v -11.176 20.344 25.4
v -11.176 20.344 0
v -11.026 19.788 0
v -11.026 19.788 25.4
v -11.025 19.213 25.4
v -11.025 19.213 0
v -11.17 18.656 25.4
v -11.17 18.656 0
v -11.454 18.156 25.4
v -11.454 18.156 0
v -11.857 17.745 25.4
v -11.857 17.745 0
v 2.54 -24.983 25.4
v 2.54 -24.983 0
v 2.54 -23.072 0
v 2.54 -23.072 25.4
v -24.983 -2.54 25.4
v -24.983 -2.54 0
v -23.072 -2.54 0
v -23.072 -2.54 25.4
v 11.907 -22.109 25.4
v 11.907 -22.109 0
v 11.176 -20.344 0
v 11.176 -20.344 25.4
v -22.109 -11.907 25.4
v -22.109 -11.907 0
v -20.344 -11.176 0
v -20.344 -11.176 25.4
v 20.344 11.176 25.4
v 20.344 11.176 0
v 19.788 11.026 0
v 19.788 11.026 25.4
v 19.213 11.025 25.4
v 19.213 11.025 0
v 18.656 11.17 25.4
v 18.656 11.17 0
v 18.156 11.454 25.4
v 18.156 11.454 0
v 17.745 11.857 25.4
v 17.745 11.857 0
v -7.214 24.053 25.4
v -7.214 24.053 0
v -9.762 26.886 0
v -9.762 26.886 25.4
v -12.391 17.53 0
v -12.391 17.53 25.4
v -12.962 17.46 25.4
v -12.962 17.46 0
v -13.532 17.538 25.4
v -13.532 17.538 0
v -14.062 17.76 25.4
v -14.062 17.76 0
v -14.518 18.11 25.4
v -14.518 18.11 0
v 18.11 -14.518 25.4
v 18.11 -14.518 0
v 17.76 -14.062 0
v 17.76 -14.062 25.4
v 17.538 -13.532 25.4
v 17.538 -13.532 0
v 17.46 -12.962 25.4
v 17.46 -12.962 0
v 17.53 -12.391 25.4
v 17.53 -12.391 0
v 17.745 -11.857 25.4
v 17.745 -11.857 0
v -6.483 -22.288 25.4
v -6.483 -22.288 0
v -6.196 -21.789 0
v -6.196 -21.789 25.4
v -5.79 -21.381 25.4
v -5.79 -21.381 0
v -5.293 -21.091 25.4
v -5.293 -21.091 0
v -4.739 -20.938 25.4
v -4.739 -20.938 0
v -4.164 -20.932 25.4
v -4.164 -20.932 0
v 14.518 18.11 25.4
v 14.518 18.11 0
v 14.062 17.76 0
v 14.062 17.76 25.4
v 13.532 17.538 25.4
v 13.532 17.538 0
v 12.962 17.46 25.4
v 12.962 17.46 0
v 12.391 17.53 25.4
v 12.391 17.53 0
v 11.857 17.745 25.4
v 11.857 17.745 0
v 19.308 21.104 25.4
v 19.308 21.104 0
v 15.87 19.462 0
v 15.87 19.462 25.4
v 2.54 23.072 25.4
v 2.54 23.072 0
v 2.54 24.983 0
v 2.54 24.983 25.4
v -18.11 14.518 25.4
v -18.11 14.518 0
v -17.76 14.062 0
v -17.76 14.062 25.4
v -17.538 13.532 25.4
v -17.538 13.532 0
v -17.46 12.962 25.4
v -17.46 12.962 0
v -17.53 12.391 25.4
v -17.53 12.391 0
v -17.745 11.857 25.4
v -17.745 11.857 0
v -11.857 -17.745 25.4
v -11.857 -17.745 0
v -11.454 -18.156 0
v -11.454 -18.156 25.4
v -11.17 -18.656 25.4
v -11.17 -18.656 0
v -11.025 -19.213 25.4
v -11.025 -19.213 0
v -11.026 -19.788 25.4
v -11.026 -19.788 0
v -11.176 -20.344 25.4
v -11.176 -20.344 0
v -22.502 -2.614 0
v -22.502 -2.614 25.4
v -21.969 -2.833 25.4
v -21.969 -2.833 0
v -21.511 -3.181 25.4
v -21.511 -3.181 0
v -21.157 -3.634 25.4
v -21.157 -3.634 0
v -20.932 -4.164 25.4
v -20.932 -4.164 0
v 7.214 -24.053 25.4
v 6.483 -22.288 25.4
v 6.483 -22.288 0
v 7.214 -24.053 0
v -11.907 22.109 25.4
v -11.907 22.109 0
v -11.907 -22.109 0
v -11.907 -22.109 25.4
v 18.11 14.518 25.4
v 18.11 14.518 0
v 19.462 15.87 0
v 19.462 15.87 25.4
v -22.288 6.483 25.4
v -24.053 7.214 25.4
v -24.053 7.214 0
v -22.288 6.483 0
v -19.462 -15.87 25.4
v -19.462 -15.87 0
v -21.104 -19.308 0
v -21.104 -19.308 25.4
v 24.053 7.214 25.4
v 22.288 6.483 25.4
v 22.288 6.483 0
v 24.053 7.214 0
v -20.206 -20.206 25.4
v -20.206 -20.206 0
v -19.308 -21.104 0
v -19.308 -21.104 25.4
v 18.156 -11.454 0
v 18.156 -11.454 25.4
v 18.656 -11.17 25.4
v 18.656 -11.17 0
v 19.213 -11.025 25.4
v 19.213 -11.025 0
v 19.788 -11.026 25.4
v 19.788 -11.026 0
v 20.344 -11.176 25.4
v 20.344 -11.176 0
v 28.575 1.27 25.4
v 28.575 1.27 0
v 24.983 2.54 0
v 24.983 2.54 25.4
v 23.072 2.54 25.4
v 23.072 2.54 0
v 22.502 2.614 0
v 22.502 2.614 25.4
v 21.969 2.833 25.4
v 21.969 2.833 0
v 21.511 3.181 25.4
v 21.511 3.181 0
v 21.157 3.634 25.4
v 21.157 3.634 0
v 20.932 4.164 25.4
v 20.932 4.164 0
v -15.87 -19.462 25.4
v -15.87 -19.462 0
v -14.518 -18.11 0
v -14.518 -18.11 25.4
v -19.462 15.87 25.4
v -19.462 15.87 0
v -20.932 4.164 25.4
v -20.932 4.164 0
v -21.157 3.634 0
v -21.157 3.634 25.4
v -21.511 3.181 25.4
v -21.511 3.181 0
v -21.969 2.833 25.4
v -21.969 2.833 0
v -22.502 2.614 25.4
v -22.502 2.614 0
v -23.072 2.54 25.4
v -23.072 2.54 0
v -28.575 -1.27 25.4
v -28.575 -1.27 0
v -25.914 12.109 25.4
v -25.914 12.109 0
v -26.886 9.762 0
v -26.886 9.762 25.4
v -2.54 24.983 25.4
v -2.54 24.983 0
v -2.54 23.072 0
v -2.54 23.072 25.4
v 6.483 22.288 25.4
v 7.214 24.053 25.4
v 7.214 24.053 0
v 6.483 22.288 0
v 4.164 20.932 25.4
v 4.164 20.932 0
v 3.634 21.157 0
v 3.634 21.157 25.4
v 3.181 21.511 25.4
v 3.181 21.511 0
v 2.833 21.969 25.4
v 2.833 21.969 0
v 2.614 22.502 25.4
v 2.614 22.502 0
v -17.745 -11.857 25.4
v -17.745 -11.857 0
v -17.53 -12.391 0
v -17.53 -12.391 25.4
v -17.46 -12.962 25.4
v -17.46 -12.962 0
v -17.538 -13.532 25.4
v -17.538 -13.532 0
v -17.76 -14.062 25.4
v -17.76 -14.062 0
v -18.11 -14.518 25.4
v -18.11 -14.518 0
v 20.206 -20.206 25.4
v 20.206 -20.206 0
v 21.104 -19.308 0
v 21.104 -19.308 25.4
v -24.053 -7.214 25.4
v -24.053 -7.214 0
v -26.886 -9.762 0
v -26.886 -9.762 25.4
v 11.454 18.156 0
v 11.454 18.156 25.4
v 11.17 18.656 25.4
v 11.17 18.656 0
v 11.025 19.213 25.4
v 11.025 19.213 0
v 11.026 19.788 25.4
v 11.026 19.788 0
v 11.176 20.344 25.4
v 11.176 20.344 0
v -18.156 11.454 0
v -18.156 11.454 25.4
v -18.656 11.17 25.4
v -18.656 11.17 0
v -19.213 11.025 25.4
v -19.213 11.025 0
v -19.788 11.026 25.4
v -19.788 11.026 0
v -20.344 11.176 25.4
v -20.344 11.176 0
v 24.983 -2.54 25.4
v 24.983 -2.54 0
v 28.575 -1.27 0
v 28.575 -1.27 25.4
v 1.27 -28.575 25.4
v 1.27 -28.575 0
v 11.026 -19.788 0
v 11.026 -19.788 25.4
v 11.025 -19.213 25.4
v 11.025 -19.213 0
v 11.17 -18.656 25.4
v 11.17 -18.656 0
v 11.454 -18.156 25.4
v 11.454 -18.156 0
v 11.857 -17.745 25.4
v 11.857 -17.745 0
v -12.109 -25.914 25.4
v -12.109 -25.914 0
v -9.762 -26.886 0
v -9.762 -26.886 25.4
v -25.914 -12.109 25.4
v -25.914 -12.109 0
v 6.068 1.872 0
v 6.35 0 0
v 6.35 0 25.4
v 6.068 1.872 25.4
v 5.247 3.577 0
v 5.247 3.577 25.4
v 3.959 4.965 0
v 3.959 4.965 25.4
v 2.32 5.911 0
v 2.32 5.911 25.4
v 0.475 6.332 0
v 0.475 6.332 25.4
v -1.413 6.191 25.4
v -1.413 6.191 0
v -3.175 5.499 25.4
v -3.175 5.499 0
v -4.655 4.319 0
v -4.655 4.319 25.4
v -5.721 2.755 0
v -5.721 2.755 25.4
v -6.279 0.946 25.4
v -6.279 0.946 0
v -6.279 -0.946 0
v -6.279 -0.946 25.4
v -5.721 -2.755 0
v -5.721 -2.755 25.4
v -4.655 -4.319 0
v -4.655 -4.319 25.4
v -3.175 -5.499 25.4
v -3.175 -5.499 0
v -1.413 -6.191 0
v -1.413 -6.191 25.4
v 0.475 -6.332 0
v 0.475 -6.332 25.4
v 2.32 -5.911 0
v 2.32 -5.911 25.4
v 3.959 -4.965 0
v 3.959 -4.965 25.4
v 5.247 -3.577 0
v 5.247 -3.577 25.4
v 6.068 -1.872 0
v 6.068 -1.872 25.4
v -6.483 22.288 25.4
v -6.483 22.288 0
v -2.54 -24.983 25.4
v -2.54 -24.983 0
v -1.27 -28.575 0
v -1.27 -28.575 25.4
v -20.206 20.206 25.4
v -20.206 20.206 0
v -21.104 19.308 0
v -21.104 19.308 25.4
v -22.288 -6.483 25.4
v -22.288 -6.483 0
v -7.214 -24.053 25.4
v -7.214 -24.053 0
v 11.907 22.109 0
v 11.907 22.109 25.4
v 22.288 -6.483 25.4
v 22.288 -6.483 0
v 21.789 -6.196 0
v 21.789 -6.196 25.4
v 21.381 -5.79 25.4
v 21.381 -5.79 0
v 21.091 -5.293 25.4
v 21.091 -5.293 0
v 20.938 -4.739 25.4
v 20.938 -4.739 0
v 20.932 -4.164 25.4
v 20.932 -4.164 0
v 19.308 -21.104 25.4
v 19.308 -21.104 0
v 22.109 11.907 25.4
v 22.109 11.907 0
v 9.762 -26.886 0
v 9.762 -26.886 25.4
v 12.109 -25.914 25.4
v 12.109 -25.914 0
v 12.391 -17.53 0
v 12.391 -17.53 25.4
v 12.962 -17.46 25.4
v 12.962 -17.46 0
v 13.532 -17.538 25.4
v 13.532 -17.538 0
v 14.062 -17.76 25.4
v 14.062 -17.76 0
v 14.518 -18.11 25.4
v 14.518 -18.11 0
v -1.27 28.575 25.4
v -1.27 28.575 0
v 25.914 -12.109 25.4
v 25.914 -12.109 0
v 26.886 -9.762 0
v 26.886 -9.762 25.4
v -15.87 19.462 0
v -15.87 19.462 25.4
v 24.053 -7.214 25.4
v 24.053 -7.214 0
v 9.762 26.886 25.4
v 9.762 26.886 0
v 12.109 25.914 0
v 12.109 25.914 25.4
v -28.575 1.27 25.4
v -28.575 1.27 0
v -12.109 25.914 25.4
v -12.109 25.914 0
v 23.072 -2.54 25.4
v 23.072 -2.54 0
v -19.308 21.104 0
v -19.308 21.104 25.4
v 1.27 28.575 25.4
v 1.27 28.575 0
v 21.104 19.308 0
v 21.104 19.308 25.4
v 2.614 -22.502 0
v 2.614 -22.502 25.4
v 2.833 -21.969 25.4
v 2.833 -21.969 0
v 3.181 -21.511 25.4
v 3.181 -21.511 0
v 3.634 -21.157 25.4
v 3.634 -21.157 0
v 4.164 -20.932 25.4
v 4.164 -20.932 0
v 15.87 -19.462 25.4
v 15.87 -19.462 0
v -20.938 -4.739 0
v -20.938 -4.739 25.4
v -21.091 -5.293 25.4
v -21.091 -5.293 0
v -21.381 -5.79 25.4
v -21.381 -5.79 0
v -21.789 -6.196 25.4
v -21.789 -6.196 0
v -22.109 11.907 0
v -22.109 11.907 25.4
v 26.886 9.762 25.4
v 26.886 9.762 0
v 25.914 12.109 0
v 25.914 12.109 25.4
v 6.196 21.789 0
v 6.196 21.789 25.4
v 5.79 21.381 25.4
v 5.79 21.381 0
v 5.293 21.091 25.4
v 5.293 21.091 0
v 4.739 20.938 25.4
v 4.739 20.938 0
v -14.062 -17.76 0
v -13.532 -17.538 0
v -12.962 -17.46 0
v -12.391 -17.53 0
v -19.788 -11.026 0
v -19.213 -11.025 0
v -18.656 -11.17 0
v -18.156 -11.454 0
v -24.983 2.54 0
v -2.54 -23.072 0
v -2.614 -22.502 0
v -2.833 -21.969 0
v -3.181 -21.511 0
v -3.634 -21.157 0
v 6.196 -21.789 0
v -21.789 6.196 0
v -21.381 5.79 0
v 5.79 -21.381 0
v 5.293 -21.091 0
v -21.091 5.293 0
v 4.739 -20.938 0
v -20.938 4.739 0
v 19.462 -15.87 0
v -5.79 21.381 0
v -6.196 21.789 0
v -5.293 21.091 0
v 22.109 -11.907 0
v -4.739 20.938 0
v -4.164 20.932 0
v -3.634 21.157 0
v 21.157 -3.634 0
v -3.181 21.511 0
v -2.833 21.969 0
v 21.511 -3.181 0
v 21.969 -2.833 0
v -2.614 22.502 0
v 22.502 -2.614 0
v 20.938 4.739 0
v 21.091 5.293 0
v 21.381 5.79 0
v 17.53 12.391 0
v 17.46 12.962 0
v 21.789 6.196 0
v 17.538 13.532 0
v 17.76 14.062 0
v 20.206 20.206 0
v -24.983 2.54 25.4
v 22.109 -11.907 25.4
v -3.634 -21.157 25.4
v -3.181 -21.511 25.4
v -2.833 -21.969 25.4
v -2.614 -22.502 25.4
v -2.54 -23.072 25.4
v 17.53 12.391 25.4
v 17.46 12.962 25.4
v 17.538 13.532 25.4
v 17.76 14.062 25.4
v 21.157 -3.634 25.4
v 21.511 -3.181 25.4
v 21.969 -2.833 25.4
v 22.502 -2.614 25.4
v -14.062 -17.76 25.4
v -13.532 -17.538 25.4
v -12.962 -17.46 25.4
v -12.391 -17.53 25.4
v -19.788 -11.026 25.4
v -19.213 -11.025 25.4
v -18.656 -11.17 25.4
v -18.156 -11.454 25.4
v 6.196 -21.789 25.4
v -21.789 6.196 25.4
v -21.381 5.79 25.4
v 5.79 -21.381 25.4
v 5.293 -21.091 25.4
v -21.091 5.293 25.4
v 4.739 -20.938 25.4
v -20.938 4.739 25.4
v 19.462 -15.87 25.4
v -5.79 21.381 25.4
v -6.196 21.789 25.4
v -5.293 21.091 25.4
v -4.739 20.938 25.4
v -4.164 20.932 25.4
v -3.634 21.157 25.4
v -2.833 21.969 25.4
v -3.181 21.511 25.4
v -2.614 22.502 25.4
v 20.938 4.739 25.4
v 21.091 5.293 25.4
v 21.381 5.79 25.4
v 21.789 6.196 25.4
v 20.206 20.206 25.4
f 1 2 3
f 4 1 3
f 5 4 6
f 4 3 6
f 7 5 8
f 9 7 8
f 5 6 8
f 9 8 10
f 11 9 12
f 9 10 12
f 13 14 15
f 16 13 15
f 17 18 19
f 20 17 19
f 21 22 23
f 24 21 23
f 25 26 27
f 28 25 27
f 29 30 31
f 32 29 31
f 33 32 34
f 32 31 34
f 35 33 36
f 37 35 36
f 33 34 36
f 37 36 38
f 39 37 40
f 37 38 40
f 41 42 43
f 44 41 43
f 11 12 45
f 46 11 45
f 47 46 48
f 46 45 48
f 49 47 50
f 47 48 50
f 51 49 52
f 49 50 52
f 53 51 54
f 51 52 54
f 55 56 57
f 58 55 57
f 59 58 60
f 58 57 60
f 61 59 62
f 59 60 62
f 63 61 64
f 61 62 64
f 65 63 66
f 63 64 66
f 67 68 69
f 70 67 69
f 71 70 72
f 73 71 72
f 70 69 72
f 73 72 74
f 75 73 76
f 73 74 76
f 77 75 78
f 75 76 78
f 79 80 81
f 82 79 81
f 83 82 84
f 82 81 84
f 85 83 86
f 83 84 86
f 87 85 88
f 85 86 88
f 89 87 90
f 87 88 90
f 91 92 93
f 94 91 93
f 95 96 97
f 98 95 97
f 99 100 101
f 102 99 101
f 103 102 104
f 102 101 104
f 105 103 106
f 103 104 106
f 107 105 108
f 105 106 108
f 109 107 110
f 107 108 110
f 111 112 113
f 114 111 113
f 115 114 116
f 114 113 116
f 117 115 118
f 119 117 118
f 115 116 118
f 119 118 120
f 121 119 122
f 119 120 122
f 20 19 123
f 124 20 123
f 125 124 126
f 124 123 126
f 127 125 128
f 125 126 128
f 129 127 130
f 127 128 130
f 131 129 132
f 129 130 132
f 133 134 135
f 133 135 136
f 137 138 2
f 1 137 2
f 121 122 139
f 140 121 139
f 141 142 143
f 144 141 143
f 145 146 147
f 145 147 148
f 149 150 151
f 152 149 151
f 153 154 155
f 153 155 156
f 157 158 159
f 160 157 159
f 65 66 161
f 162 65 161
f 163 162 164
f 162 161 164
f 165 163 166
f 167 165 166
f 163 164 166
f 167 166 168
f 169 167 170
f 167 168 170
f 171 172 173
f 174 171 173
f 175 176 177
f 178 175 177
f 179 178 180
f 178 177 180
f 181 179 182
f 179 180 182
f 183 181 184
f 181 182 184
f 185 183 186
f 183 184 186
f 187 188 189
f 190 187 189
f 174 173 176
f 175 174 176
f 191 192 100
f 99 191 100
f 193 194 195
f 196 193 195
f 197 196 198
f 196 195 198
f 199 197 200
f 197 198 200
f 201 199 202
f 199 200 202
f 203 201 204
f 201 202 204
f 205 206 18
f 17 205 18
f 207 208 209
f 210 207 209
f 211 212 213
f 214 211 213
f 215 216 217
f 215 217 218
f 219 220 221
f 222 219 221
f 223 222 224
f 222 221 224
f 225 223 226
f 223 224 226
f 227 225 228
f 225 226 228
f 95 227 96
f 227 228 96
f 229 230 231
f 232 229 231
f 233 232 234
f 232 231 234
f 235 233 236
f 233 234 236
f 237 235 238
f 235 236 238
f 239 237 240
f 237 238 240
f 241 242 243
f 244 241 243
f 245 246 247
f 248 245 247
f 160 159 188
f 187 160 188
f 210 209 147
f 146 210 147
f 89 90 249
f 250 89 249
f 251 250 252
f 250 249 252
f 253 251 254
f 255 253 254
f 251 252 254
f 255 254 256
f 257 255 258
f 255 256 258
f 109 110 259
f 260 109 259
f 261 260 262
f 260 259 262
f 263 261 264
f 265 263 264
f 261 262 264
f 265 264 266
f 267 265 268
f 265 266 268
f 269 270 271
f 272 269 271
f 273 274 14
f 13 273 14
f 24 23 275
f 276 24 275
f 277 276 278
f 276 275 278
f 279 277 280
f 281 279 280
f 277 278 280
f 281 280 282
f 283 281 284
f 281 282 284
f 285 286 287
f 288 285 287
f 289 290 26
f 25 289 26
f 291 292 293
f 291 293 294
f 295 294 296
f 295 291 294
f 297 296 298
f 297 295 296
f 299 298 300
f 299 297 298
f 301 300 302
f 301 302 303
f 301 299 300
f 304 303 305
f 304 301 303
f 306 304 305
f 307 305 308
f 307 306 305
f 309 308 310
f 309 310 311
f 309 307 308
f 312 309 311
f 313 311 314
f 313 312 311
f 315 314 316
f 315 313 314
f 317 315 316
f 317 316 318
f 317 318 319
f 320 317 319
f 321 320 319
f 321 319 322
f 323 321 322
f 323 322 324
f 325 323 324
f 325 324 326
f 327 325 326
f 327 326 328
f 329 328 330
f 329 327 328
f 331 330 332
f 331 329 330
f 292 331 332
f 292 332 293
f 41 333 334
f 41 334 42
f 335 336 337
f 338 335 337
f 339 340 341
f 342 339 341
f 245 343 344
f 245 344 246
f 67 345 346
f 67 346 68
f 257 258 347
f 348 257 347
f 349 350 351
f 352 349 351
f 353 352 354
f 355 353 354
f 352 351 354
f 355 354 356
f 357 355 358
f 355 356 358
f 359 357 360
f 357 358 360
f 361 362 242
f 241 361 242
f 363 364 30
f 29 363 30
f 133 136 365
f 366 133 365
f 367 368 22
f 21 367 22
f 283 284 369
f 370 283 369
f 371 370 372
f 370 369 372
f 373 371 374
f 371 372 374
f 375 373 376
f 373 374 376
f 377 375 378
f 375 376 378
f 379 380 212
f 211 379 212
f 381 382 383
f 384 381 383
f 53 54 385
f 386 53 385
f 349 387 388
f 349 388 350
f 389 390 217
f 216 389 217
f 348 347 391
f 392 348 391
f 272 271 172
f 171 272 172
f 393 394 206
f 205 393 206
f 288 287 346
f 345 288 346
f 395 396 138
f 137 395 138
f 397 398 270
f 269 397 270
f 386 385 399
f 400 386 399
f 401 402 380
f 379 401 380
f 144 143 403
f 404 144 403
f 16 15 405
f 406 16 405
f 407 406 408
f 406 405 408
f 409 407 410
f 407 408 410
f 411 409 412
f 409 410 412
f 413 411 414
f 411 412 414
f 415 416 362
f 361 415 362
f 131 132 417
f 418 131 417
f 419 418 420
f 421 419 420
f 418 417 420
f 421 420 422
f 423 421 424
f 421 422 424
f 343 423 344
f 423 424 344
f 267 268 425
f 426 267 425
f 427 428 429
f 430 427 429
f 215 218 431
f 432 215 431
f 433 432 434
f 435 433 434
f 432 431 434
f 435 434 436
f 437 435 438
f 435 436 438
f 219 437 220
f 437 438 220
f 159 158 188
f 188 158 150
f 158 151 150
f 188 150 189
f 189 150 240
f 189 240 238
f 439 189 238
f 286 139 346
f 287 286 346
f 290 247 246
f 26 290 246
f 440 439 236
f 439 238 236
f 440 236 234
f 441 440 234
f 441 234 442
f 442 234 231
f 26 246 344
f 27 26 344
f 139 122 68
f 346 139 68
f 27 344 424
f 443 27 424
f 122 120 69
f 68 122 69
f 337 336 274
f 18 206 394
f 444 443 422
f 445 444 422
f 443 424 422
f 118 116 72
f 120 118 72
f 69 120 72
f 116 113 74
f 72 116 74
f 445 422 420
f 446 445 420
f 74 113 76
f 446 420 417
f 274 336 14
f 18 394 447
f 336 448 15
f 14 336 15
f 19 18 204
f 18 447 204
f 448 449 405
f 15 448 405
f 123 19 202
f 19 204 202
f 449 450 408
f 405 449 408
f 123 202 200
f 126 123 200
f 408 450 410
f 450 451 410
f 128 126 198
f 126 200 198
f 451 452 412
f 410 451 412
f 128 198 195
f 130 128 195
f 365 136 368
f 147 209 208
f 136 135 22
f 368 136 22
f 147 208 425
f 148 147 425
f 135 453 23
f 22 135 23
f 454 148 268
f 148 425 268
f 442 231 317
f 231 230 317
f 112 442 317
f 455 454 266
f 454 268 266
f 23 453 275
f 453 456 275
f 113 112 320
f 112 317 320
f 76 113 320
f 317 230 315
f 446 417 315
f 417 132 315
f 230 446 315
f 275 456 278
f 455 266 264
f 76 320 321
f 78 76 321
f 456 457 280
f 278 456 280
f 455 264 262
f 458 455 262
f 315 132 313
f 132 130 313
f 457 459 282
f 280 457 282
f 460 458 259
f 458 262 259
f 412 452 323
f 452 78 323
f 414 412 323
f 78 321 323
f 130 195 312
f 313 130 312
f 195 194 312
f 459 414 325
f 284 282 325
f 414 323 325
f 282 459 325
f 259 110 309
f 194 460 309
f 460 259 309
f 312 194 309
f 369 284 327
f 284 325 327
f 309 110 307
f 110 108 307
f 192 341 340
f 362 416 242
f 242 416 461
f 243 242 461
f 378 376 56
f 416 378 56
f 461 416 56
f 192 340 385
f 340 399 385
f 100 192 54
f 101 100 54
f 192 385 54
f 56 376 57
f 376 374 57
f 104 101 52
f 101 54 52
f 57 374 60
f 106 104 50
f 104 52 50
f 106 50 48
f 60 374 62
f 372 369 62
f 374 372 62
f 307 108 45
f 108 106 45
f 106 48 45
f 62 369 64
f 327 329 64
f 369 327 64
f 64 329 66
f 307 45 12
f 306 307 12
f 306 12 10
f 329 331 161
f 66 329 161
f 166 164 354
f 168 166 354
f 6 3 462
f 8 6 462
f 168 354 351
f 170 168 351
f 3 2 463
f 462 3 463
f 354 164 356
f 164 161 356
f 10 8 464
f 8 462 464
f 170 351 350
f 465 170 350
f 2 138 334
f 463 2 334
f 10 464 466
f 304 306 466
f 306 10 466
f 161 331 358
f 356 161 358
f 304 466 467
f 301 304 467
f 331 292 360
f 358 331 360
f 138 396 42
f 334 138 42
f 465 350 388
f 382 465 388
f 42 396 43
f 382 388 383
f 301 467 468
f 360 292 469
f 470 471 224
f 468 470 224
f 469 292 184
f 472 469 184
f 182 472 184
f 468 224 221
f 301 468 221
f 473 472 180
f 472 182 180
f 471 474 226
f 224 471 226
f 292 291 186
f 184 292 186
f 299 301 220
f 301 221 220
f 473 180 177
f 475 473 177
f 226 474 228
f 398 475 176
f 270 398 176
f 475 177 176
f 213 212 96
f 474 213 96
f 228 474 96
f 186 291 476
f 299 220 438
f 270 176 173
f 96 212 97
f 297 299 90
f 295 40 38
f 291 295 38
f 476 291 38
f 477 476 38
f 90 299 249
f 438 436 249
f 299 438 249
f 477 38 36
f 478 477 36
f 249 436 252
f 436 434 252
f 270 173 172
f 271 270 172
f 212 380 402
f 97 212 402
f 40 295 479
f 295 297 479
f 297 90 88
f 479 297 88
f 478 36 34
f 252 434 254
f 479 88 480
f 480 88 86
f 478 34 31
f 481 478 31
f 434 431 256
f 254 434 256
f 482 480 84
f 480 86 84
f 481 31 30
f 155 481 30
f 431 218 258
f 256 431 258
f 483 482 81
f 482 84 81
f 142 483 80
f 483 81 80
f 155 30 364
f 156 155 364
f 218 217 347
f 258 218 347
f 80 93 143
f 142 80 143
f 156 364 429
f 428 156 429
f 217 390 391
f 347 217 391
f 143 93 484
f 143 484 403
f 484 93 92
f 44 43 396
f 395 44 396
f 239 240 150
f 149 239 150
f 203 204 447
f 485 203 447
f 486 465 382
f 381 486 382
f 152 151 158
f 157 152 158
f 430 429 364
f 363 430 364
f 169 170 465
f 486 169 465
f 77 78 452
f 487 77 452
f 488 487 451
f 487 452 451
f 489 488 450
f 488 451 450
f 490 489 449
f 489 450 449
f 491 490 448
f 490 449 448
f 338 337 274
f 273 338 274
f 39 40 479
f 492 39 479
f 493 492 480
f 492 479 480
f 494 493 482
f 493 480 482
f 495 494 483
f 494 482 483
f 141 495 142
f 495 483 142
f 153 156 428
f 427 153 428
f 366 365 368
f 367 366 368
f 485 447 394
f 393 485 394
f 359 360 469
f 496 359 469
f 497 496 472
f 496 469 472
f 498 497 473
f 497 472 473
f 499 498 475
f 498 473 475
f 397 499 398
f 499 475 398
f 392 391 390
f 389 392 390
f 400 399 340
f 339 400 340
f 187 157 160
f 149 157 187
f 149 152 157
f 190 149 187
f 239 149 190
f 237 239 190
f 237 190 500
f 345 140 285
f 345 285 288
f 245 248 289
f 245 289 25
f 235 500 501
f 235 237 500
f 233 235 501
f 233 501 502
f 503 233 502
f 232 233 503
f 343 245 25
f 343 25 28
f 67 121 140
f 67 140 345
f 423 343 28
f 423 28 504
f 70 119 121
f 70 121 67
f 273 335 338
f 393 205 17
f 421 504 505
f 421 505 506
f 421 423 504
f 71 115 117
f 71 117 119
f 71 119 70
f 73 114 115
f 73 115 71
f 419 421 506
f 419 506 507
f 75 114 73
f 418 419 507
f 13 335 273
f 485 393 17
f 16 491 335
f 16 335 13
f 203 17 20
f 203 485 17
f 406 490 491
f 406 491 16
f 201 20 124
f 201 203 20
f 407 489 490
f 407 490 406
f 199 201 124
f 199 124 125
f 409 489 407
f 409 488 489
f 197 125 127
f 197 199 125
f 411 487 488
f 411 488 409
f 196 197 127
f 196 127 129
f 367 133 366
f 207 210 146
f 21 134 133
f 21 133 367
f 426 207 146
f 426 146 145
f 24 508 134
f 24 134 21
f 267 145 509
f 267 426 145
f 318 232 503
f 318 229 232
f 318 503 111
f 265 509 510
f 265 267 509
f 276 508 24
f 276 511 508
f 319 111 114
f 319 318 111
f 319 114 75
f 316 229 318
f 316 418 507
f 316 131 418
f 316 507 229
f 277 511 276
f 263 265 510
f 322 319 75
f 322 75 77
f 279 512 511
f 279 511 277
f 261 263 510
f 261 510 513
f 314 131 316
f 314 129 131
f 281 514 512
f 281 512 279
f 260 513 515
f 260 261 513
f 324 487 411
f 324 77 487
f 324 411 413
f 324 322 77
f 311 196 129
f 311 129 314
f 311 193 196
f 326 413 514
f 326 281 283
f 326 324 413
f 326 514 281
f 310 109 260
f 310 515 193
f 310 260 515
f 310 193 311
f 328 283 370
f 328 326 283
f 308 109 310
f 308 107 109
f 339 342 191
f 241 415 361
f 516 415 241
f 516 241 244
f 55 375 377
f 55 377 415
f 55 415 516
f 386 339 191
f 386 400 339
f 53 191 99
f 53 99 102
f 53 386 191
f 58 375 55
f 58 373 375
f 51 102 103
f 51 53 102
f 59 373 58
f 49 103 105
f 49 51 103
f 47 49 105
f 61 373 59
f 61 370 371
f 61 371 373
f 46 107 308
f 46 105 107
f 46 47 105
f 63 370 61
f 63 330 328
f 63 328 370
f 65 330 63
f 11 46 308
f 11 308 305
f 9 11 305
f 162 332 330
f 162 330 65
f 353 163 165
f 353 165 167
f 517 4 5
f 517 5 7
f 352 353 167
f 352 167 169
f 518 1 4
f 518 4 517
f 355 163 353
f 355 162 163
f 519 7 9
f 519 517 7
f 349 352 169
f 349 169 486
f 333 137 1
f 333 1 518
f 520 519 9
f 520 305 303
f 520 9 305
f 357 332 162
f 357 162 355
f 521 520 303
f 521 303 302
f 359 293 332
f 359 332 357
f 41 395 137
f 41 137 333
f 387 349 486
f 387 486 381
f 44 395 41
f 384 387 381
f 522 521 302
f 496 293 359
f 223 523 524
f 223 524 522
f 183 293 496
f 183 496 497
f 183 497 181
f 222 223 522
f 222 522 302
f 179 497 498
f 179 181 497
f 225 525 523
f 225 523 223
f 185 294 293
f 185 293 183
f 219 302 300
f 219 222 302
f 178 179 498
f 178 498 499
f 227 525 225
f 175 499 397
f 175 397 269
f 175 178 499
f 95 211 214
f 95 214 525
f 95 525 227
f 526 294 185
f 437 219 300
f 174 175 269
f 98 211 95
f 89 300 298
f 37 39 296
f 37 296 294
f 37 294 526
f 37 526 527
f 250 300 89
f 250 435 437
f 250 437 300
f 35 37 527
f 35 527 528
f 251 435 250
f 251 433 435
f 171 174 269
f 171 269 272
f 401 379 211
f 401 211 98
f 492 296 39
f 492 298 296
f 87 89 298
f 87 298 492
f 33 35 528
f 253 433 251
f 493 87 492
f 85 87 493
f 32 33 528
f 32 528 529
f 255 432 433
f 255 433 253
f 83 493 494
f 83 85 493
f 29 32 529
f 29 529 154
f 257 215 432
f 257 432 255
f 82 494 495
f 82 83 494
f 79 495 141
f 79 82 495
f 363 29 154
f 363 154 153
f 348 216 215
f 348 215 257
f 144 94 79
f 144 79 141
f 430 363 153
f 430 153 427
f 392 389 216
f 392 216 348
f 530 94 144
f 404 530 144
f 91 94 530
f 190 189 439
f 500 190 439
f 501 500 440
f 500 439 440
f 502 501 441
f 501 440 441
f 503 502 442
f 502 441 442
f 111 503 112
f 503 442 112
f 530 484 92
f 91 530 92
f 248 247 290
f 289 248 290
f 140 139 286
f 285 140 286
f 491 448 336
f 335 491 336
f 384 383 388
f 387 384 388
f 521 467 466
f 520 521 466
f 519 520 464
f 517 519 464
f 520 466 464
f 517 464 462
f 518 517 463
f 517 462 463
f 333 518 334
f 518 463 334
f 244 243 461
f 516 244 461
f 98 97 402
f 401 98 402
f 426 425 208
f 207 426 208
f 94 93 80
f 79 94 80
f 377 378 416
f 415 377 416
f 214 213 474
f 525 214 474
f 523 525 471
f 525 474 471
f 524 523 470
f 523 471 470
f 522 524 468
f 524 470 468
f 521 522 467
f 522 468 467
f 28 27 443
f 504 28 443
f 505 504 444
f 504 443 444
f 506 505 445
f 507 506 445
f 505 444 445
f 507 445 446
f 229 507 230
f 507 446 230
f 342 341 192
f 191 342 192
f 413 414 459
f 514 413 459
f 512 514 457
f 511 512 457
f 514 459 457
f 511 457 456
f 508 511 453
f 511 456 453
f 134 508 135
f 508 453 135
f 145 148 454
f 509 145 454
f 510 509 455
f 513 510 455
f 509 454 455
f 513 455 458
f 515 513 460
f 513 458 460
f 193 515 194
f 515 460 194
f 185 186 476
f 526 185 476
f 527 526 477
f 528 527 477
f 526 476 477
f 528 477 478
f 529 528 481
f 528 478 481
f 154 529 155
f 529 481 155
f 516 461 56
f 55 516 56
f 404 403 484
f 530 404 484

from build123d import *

# Parameters (mm, degrees)
F0_R     = 6.35
F1_DEPTH = 25.4


with BuildPart() as f1:
    # F0 (on Top) → F1 (new body)
    with BuildSketch(Plane.XY):
        with BuildLine():
            Line((1.27, 28.575), (0, 28.575))
            Line((0, 28.575), (-1.27, 28.575))
            Line((-1.27, 28.575), (-2.54, 24.982901))
            Line((-2.54, 24.982901), (-2.54, 23.072094))
            ThreePointArc((-2.54, 23.072094), (-2.991826, 21.728881), (-4.163596, 20.931809))
            ThreePointArc((-4.163596, 20.931809), (-5.551196, 21.219791), (-6.482654, 22.287851))
            Line((-6.482654, 22.287851), (-7.213888, 24.053207))
            Line((-7.213888, 24.053207), (-9.761852, 26.885866))
            Line((-9.761852, 26.885866), (-10.935179, 26.399858))
            Line((-10.935179, 26.399858), (-12.108506, 25.91385))
            Line((-12.108506, 25.91385), (-11.907196, 22.109175))
            Line((-11.907196, 22.109175), (-11.175962, 20.343819))
            ThreePointArc((-11.175962, 20.343819), (-11.07937, 18.929946), (-11.856917, 17.745131))
            ThreePointArc((-11.856917, 17.745131), (-13.249099, 17.48018), (-14.518383, 18.110485))
            Line((-14.518383, 18.110485), (-15.869528, 19.46163))
            Line((-15.869528, 19.46163), (-19.307551, 21.103602))
            Line((-19.307551, 21.103602), (-20.205576, 20.205576))
            Line((-20.205576, 20.205576), (-21.103602, 19.307551))
            Line((-21.103602, 19.307551), (-19.46163, 15.869528))
            Line((-19.46163, 15.869528), (-18.110485, 14.518383))
            ThreePointArc((-18.110485, 14.518383), (-17.48018, 13.249099), (-17.745131, 11.856917))
            ThreePointArc((-17.745131, 11.856917), (-18.929946, 11.07937), (-20.343819, 11.175962))
            Line((-20.343819, 11.175962), (-22.109175, 11.907196))
            Line((-22.109175, 11.907196), (-25.91385, 12.108506))
            Line((-25.91385, 12.108506), (-26.399858, 10.935179))
            Line((-26.399858, 10.935179), (-26.885866, 9.761852))
            Line((-26.885866, 9.761852), (-24.053207, 7.213888))
            Line((-24.053207, 7.213888), (-22.287851, 6.482654))
            ThreePointArc((-22.287851, 6.482654), (-21.219791, 5.551196), (-20.931809, 4.163596))
            ThreePointArc((-20.931809, 4.163596), (-21.728881, 2.991826), (-23.072094, 2.54))
            Line((-23.072094, 2.54), (-24.982901, 2.54))
            Line((-24.982901, 2.54), (-28.575, 1.27))
            Line((-28.575, 1.27), (-28.575, 0))
            Line((-28.575, 0), (-28.575, -1.27))
            Line((-28.575, -1.27), (-24.982901, -2.54))
            Line((-24.982901, -2.54), (-23.072094, -2.54))
            ThreePointArc((-23.072094, -2.54), (-21.728881, -2.991826), (-20.931809, -4.163596))
            ThreePointArc((-20.931809, -4.163596), (-21.219791, -5.551196), (-22.287851, -6.482654))
            Line((-22.287851, -6.482654), (-24.053207, -7.213888))
            Line((-24.053207, -7.213888), (-26.885866, -9.761852))
            Line((-26.885866, -9.761852), (-26.399858, -10.935179))
            Line((-26.399858, -10.935179), (-25.91385, -12.108506))
            Line((-25.91385, -12.108506), (-22.109175, -11.907196))
            Line((-22.109175, -11.907196), (-20.343819, -11.175962))
            ThreePointArc((-20.343819, -11.175962), (-18.929946, -11.07937), (-17.745131, -11.856917))
            ThreePointArc((-17.745131, -11.856917), (-17.48018, -13.249099), (-18.110485, -14.518383))
            Line((-18.110485, -14.518383), (-19.46163, -15.869528))
            Line((-19.46163, -15.869528), (-21.103602, -19.307551))
            Line((-21.103602, -19.307551), (-20.205576, -20.205576))
            Line((-20.205576, -20.205576), (-19.307551, -21.103602))
            Line((-19.307551, -21.103602), (-15.869528, -19.46163))
            Line((-15.869528, -19.46163), (-14.518383, -18.110485))
            ThreePointArc((-14.518383, -18.110485), (-13.249099, -17.48018), (-11.856917, -17.745131))
            ThreePointArc((-11.856917, -17.745131), (-11.07937, -18.929946), (-11.175962, -20.343819))
            Line((-11.175962, -20.343819), (-11.907196, -22.109175))
            Line((-11.907196, -22.109175), (-12.108506, -25.91385))
            Line((-12.108506, -25.91385), (-10.935179, -26.399858))
            Line((-10.935179, -26.399858), (-9.761852, -26.885866))
            Line((-9.761852, -26.885866), (-7.213888, -24.053207))
            Line((-7.213888, -24.053207), (-6.482654, -22.287851))
            ThreePointArc((-6.482654, -22.287851), (-5.551196, -21.219791), (-4.163596, -20.931809))
            ThreePointArc((-4.163596, -20.931809), (-2.991826, -21.728881), (-2.54, -23.072094))
            Line((-2.54, -23.072094), (-2.54, -24.982901))
            Line((-2.54, -24.982901), (-1.27, -28.575))
            Line((-1.27, -28.575), (0, -28.575))
            Line((0, -28.575), (1.27, -28.575))
            Line((1.27, -28.575), (2.54, -24.982901))
            Line((2.54, -24.982901), (2.54, -23.072094))
            ThreePointArc((2.54, -23.072094), (2.991826, -21.728881), (4.163596, -20.931809))
            ThreePointArc((4.163596, -20.931809), (5.551196, -21.219791), (6.482654, -22.287851))
            Line((6.482654, -22.287851), (7.213888, -24.053207))
            Line((7.213888, -24.053207), (9.761852, -26.885866))
            Line((9.761852, -26.885866), (10.935179, -26.399858))
            Line((10.935179, -26.399858), (12.108506, -25.91385))
            Line((12.108506, -25.91385), (11.907196, -22.109175))
            Line((11.907196, -22.109175), (11.175962, -20.343819))
            ThreePointArc((11.175962, -20.343819), (11.07937, -18.929946), (11.856917, -17.745131))
            ThreePointArc((11.856917, -17.745131), (13.249099, -17.48018), (14.518383, -18.110485))
            Line((14.518383, -18.110485), (15.869528, -19.46163))
            Line((15.869528, -19.46163), (19.307551, -21.103602))
            Line((19.307551, -21.103602), (20.205576, -20.205576))
            Line((20.205576, -20.205576), (21.103602, -19.307551))
            Line((21.103602, -19.307551), (19.46163, -15.869528))
            Line((19.46163, -15.869528), (18.110485, -14.518383))
            ThreePointArc((18.110485, -14.518383), (17.48018, -13.249099), (17.745131, -11.856917))
            ThreePointArc((17.745131, -11.856917), (18.929946, -11.07937), (20.343819, -11.175962))
            Line((20.343819, -11.175962), (22.109175, -11.907196))
            Line((22.109175, -11.907196), (25.91385, -12.108506))
            Line((25.91385, -12.108506), (26.399858, -10.935179))
            Line((26.399858, -10.935179), (26.885866, -9.761852))
            Line((26.885866, -9.761852), (24.053207, -7.213888))
            Line((24.053207, -7.213888), (22.287851, -6.482654))
            ThreePointArc((22.287851, -6.482654), (21.219791, -5.551196), (20.931809, -4.163596))
            ThreePointArc((20.931809, -4.163596), (21.728881, -2.991826), (23.072094, -2.54))
            Line((23.072094, -2.54), (24.982901, -2.54))
            Line((24.982901, -2.54), (28.575, -1.27))
            Line((28.575, -1.27), (28.575, 0))
            Line((28.575, 0), (28.575, 1.27))
            Line((28.575, 1.27), (24.982901, 2.54))
            Line((24.982901, 2.54), (23.072094, 2.54))
            ThreePointArc((23.072094, 2.54), (21.728881, 2.991826), (20.931809, 4.163596))
            ThreePointArc((20.931809, 4.163596), (21.219791, 5.551196), (22.287851, 6.482654))
            Line((22.287851, 6.482654), (24.053207, 7.213888))
            Line((24.053207, 7.213888), (26.885866, 9.761852))
            Line((26.885866, 9.761852), (26.399858, 10.935179))
            Line((26.399858, 10.935179), (25.91385, 12.108506))
            Line((25.91385, 12.108506), (22.109175, 11.907196))
            Line((22.109175, 11.907196), (20.343819, 11.175962))
            ThreePointArc((20.343819, 11.175962), (18.929946, 11.07937), (17.745131, 11.856917))
            ThreePointArc((17.745131, 11.856917), (17.48018, 13.249099), (18.110485, 14.518383))
            Line((18.110485, 14.518383), (19.46163, 15.869528))
            Line((19.46163, 15.869528), (21.103602, 19.307551))
            Line((21.103602, 19.307551), (20.205576, 20.205576))
            Line((20.205576, 20.205576), (19.307551, 21.103602))
            Line((19.307551, 21.103602), (15.869528, 19.46163))
            Line((15.869528, 19.46163), (14.518383, 18.110485))
            ThreePointArc((14.518383, 18.110485), (13.249099, 17.48018), (11.856917, 17.745131))
            ThreePointArc((11.856917, 17.745131), (11.07937, 18.929946), (11.175962, 20.343819))
            Line((11.175962, 20.343819), (11.907196, 22.109175))
            Line((11.907196, 22.109175), (12.108506, 25.91385))
            Line((12.108506, 25.91385), (10.935179, 26.399858))
            Line((10.935179, 26.399858), (9.761852, 26.885866))
            Line((9.761852, 26.885866), (7.213888, 24.053207))
            Line((7.213888, 24.053207), (6.482654, 22.287851))
            ThreePointArc((6.482654, 22.287851), (5.551196, 21.219791), (4.163596, 20.931809))
            ThreePointArc((4.163596, 20.931809), (2.991826, 21.728881), (2.54, 23.072094))
            Line((2.54, 23.072094), (2.54, 24.982901))
            Line((2.54, 24.982901), (1.27, 28.575))
        make_face()
        Circle(F0_R, mode=Mode.SUBTRACT)
    extrude(amount=F1_DEPTH)


solid = f1.part
